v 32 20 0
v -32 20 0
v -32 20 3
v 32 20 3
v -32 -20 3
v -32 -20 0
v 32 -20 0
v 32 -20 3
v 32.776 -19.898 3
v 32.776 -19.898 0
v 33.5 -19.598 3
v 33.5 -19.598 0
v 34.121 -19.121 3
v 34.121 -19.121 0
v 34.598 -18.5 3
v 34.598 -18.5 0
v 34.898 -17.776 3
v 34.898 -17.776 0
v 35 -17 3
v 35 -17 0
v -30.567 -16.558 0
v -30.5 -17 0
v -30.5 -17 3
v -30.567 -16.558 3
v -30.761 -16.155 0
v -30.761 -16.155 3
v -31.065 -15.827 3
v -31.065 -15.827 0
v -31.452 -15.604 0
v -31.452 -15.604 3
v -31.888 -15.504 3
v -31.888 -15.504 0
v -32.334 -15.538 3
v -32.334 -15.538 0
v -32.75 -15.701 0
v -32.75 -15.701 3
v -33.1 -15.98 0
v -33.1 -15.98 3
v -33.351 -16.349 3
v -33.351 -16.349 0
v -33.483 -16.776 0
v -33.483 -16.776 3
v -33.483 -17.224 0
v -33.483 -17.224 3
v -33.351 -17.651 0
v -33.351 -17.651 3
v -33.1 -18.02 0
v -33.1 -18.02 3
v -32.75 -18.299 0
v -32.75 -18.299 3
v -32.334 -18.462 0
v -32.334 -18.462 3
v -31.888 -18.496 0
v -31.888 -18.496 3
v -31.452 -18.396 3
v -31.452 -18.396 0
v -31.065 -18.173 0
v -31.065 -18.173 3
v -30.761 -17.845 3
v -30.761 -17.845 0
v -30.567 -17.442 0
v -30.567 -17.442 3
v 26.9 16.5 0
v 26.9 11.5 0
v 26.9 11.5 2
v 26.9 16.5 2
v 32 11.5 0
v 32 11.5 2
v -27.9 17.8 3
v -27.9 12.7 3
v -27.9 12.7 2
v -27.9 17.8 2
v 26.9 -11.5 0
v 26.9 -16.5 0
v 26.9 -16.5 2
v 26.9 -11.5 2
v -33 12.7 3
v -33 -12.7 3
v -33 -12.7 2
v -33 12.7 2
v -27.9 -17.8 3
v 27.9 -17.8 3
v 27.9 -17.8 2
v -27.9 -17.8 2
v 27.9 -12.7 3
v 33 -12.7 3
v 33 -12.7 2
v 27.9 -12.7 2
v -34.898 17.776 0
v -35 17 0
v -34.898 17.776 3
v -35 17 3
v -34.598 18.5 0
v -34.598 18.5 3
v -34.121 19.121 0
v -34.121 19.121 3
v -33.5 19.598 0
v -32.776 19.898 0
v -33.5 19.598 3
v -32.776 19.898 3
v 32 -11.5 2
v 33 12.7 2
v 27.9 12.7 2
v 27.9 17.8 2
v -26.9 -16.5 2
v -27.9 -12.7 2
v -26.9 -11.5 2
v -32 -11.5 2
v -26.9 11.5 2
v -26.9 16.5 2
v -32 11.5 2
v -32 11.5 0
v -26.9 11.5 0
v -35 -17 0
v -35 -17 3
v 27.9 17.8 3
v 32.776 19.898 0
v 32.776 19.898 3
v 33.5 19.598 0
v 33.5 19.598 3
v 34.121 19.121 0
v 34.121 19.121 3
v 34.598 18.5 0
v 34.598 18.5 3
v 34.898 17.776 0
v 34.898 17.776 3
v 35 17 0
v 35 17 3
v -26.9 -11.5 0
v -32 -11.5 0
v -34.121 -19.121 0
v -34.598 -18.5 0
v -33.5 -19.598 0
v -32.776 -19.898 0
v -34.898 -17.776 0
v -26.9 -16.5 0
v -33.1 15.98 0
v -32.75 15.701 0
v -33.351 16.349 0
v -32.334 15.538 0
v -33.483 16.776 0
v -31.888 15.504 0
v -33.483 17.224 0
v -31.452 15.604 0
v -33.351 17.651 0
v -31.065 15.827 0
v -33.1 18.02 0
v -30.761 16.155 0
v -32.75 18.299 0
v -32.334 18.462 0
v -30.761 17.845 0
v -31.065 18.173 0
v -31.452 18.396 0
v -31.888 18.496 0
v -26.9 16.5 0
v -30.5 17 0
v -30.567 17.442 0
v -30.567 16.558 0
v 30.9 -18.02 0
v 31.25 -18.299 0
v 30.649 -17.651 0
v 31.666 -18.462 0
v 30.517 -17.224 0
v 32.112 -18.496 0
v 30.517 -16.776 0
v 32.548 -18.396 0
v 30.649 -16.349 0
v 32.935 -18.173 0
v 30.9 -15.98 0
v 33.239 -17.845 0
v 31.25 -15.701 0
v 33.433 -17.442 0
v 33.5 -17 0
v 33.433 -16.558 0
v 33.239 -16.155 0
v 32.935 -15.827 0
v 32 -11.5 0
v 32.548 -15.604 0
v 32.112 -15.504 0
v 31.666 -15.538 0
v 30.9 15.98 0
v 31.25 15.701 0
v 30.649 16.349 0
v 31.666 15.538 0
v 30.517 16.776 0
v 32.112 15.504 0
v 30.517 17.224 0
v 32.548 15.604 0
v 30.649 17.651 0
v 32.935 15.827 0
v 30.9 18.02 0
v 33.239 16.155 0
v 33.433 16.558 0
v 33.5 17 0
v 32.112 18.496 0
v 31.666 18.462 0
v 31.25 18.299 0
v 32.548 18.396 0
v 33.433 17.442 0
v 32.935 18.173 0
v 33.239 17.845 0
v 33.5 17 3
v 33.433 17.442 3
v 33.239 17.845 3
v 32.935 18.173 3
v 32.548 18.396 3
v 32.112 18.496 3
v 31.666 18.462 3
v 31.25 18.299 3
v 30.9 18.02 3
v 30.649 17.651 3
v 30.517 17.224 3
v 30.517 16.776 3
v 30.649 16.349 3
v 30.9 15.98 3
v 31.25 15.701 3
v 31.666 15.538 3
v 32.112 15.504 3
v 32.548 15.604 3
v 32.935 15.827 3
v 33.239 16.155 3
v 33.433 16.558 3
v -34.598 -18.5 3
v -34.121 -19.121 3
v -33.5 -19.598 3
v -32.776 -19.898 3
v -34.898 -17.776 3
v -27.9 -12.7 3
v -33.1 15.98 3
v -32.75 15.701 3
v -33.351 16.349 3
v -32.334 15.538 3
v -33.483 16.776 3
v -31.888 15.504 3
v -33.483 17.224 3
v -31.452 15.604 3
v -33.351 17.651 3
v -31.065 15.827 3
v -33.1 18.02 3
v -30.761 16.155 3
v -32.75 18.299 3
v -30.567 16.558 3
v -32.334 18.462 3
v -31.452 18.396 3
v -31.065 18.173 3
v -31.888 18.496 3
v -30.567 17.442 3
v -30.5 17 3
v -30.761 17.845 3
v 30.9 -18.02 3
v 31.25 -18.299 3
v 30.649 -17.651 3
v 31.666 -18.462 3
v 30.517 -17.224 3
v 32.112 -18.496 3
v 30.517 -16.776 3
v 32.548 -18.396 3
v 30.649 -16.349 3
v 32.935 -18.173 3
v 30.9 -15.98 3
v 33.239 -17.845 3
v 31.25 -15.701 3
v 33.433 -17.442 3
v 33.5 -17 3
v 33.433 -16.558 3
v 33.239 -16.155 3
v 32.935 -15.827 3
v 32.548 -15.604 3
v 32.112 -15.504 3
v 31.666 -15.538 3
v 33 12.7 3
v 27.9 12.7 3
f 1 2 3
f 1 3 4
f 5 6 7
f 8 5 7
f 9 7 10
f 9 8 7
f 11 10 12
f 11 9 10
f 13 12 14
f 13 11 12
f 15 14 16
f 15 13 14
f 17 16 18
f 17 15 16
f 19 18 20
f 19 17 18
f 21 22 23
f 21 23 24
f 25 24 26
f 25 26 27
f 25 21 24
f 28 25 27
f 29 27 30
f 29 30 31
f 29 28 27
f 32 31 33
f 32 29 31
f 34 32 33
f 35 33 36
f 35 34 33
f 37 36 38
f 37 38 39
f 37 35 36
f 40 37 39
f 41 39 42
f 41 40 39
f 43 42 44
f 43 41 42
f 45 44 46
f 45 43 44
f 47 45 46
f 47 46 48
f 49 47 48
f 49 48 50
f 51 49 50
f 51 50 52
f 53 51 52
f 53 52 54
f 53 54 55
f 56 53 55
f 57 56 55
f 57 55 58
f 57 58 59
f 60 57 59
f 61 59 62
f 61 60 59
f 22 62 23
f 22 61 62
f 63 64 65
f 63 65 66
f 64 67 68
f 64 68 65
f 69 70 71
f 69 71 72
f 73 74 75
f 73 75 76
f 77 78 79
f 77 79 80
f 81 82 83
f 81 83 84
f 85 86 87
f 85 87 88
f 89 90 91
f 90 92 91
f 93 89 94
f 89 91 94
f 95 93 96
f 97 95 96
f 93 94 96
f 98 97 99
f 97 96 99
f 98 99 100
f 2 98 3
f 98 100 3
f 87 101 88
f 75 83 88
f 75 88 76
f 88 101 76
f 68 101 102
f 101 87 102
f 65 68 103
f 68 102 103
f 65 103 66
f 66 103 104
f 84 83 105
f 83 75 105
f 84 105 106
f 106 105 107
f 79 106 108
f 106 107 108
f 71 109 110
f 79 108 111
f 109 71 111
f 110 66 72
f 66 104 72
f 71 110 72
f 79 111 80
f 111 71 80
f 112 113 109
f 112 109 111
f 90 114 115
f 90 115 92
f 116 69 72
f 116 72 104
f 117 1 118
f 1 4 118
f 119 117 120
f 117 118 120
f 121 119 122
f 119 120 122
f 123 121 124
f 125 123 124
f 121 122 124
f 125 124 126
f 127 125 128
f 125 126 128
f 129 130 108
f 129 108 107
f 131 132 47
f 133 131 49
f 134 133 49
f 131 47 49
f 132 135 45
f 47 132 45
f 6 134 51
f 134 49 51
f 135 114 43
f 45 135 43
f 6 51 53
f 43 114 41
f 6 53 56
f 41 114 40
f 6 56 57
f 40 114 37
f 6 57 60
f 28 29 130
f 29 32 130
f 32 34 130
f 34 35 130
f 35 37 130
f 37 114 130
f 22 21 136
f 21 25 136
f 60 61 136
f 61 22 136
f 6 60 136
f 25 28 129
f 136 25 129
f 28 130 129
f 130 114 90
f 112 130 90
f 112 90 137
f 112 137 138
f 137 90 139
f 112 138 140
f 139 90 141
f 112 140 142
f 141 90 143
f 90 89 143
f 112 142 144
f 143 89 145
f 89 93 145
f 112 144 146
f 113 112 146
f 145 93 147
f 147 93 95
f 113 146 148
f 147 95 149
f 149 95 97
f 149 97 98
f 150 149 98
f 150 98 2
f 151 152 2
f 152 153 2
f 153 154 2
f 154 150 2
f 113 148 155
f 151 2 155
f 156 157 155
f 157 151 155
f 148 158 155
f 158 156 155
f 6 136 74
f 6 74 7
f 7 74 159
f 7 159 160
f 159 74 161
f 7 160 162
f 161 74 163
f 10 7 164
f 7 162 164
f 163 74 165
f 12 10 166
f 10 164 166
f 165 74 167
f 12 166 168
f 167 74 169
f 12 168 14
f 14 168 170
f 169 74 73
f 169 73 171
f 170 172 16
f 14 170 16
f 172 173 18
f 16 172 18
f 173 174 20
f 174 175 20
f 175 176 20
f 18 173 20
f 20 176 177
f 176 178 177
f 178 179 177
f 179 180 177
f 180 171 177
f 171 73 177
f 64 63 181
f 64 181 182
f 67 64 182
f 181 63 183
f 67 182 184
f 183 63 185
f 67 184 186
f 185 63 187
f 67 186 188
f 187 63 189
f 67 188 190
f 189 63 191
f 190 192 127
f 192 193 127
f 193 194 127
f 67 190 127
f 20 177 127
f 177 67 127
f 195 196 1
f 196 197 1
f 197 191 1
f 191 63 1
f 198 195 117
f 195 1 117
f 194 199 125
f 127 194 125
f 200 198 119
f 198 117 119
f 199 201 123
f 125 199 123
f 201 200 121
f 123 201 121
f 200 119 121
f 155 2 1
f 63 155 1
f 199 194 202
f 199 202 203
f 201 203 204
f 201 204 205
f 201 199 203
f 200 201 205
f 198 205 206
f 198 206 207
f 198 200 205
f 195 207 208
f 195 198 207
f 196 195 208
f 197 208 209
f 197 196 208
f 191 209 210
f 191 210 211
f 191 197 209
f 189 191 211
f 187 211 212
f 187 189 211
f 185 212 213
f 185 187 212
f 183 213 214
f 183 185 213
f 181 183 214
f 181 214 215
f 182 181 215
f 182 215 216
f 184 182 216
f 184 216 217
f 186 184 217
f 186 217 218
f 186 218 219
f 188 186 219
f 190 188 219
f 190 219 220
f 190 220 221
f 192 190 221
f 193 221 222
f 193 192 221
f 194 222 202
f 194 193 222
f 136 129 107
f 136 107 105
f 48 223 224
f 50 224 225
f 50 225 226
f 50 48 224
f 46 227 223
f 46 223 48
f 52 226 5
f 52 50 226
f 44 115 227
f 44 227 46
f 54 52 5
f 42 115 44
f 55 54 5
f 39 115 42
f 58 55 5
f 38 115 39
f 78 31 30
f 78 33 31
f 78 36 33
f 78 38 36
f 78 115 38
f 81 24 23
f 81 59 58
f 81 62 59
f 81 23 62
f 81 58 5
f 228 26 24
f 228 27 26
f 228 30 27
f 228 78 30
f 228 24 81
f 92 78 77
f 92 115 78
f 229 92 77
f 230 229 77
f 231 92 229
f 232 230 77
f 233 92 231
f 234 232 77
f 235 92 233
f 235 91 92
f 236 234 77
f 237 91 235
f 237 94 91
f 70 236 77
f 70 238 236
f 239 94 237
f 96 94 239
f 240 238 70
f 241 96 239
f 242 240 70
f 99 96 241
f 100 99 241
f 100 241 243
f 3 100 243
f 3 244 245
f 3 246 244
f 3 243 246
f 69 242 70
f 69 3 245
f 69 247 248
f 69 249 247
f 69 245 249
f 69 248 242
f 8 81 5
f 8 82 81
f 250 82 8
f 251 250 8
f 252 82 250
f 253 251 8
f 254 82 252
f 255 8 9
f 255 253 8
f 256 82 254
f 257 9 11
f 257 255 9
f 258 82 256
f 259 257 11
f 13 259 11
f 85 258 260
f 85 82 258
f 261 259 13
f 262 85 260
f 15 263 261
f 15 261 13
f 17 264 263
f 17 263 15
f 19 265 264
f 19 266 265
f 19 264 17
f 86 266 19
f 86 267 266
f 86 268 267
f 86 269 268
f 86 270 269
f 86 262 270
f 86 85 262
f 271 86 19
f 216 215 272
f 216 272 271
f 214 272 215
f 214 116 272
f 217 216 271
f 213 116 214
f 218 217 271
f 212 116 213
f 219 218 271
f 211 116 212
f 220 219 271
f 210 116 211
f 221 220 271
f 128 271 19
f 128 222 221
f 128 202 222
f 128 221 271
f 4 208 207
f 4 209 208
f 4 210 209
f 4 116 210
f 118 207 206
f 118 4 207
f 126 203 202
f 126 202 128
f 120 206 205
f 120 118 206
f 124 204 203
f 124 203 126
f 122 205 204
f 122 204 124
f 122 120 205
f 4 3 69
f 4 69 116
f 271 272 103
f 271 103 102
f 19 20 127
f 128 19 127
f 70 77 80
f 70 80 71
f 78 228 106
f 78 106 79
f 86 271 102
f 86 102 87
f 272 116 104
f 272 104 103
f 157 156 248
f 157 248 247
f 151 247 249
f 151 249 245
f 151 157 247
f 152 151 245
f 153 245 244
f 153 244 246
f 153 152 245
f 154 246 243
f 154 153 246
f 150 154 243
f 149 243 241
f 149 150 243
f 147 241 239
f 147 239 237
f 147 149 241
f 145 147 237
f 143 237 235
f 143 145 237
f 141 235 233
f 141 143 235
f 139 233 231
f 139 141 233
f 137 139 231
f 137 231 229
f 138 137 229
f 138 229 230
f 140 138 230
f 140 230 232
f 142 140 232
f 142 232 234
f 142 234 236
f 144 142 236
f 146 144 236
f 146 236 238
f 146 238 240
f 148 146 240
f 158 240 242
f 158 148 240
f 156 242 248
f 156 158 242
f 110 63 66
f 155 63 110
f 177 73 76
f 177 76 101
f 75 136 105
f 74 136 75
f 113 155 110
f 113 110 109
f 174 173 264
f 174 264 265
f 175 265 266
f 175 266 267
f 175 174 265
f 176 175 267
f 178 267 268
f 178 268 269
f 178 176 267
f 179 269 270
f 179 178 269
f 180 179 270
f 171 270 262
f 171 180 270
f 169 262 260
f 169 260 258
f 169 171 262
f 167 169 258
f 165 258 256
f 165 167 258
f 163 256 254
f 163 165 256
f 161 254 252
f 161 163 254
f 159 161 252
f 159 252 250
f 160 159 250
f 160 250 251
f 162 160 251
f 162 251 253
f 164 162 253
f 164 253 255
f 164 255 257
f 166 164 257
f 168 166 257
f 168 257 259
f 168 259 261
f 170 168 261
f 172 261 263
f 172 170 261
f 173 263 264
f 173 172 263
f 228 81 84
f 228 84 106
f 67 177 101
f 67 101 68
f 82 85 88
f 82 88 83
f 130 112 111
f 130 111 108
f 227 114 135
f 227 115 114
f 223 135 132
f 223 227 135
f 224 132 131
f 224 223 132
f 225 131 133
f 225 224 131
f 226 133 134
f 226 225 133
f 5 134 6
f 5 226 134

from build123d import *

# Parameters (mm, degrees)
SKETCH_W     = 70
SKETCH_H     = 40
SKETCH_R     = 1.5
PAD_DEPTH    = 3
POCKET_DEPTH = 1
FILLET_R     = 3


with BuildPart() as part:
    # Sketch → Pad (new body)
    with BuildSketch(Plane.XY):
        Rectangle(SKETCH_W, SKETCH_H)
        with Locations((-32, 17)):
            Circle(SKETCH_R, mode=Mode.SUBTRACT)
        with Locations((-32, -17)):
            Circle(SKETCH_R, mode=Mode.SUBTRACT)
        with Locations((32, -17)):
            Circle(SKETCH_R, mode=Mode.SUBTRACT)
        with Locations((32, 17)):
            Circle(SKETCH_R, mode=Mode.SUBTRACT)
        Polygon((-32, 11.5), (-32, -11.5), (-26.9, -11.5), (-26.9, -16.5), (26.9, -16.5), (26.9, -11.5), (32, -11.5), (32, 11.5), (26.9, 11.5), (26.9, 16.5), (-26.9, 16.5), (-26.9, 11.5), align=None, mode=Mode.SUBTRACT)
    extrude(amount=PAD_DEPTH)

    # Sketch001 → Pocket (cut)
    with BuildSketch(Plane.XY.offset(3)):
        Polygon((-27.9, 17.8), (27.9, 17.8), (27.9, 12.7), (33, 12.7), (33, -12.7), (27.9, -12.7), (27.9, -17.8), (-27.9, -17.8), (-27.9, -12.7), (-33, -12.7), (-33, 12.7), (-27.9, 12.7), align=None)
    extrude(amount=-POCKET_DEPTH, mode=Mode.SUBTRACT)

    # Fillet
    fillet_edges = [part.edges().sort_by_distance(p)[0] for p in [
        (-35, -20, 1.5),
        (35, -20, 1.5),
        (35, 20, 1.5),
        (-35, 20, 1.5),
    ]]
    fillet(fillet_edges, radius=FILLET_R)


solid = part.part
